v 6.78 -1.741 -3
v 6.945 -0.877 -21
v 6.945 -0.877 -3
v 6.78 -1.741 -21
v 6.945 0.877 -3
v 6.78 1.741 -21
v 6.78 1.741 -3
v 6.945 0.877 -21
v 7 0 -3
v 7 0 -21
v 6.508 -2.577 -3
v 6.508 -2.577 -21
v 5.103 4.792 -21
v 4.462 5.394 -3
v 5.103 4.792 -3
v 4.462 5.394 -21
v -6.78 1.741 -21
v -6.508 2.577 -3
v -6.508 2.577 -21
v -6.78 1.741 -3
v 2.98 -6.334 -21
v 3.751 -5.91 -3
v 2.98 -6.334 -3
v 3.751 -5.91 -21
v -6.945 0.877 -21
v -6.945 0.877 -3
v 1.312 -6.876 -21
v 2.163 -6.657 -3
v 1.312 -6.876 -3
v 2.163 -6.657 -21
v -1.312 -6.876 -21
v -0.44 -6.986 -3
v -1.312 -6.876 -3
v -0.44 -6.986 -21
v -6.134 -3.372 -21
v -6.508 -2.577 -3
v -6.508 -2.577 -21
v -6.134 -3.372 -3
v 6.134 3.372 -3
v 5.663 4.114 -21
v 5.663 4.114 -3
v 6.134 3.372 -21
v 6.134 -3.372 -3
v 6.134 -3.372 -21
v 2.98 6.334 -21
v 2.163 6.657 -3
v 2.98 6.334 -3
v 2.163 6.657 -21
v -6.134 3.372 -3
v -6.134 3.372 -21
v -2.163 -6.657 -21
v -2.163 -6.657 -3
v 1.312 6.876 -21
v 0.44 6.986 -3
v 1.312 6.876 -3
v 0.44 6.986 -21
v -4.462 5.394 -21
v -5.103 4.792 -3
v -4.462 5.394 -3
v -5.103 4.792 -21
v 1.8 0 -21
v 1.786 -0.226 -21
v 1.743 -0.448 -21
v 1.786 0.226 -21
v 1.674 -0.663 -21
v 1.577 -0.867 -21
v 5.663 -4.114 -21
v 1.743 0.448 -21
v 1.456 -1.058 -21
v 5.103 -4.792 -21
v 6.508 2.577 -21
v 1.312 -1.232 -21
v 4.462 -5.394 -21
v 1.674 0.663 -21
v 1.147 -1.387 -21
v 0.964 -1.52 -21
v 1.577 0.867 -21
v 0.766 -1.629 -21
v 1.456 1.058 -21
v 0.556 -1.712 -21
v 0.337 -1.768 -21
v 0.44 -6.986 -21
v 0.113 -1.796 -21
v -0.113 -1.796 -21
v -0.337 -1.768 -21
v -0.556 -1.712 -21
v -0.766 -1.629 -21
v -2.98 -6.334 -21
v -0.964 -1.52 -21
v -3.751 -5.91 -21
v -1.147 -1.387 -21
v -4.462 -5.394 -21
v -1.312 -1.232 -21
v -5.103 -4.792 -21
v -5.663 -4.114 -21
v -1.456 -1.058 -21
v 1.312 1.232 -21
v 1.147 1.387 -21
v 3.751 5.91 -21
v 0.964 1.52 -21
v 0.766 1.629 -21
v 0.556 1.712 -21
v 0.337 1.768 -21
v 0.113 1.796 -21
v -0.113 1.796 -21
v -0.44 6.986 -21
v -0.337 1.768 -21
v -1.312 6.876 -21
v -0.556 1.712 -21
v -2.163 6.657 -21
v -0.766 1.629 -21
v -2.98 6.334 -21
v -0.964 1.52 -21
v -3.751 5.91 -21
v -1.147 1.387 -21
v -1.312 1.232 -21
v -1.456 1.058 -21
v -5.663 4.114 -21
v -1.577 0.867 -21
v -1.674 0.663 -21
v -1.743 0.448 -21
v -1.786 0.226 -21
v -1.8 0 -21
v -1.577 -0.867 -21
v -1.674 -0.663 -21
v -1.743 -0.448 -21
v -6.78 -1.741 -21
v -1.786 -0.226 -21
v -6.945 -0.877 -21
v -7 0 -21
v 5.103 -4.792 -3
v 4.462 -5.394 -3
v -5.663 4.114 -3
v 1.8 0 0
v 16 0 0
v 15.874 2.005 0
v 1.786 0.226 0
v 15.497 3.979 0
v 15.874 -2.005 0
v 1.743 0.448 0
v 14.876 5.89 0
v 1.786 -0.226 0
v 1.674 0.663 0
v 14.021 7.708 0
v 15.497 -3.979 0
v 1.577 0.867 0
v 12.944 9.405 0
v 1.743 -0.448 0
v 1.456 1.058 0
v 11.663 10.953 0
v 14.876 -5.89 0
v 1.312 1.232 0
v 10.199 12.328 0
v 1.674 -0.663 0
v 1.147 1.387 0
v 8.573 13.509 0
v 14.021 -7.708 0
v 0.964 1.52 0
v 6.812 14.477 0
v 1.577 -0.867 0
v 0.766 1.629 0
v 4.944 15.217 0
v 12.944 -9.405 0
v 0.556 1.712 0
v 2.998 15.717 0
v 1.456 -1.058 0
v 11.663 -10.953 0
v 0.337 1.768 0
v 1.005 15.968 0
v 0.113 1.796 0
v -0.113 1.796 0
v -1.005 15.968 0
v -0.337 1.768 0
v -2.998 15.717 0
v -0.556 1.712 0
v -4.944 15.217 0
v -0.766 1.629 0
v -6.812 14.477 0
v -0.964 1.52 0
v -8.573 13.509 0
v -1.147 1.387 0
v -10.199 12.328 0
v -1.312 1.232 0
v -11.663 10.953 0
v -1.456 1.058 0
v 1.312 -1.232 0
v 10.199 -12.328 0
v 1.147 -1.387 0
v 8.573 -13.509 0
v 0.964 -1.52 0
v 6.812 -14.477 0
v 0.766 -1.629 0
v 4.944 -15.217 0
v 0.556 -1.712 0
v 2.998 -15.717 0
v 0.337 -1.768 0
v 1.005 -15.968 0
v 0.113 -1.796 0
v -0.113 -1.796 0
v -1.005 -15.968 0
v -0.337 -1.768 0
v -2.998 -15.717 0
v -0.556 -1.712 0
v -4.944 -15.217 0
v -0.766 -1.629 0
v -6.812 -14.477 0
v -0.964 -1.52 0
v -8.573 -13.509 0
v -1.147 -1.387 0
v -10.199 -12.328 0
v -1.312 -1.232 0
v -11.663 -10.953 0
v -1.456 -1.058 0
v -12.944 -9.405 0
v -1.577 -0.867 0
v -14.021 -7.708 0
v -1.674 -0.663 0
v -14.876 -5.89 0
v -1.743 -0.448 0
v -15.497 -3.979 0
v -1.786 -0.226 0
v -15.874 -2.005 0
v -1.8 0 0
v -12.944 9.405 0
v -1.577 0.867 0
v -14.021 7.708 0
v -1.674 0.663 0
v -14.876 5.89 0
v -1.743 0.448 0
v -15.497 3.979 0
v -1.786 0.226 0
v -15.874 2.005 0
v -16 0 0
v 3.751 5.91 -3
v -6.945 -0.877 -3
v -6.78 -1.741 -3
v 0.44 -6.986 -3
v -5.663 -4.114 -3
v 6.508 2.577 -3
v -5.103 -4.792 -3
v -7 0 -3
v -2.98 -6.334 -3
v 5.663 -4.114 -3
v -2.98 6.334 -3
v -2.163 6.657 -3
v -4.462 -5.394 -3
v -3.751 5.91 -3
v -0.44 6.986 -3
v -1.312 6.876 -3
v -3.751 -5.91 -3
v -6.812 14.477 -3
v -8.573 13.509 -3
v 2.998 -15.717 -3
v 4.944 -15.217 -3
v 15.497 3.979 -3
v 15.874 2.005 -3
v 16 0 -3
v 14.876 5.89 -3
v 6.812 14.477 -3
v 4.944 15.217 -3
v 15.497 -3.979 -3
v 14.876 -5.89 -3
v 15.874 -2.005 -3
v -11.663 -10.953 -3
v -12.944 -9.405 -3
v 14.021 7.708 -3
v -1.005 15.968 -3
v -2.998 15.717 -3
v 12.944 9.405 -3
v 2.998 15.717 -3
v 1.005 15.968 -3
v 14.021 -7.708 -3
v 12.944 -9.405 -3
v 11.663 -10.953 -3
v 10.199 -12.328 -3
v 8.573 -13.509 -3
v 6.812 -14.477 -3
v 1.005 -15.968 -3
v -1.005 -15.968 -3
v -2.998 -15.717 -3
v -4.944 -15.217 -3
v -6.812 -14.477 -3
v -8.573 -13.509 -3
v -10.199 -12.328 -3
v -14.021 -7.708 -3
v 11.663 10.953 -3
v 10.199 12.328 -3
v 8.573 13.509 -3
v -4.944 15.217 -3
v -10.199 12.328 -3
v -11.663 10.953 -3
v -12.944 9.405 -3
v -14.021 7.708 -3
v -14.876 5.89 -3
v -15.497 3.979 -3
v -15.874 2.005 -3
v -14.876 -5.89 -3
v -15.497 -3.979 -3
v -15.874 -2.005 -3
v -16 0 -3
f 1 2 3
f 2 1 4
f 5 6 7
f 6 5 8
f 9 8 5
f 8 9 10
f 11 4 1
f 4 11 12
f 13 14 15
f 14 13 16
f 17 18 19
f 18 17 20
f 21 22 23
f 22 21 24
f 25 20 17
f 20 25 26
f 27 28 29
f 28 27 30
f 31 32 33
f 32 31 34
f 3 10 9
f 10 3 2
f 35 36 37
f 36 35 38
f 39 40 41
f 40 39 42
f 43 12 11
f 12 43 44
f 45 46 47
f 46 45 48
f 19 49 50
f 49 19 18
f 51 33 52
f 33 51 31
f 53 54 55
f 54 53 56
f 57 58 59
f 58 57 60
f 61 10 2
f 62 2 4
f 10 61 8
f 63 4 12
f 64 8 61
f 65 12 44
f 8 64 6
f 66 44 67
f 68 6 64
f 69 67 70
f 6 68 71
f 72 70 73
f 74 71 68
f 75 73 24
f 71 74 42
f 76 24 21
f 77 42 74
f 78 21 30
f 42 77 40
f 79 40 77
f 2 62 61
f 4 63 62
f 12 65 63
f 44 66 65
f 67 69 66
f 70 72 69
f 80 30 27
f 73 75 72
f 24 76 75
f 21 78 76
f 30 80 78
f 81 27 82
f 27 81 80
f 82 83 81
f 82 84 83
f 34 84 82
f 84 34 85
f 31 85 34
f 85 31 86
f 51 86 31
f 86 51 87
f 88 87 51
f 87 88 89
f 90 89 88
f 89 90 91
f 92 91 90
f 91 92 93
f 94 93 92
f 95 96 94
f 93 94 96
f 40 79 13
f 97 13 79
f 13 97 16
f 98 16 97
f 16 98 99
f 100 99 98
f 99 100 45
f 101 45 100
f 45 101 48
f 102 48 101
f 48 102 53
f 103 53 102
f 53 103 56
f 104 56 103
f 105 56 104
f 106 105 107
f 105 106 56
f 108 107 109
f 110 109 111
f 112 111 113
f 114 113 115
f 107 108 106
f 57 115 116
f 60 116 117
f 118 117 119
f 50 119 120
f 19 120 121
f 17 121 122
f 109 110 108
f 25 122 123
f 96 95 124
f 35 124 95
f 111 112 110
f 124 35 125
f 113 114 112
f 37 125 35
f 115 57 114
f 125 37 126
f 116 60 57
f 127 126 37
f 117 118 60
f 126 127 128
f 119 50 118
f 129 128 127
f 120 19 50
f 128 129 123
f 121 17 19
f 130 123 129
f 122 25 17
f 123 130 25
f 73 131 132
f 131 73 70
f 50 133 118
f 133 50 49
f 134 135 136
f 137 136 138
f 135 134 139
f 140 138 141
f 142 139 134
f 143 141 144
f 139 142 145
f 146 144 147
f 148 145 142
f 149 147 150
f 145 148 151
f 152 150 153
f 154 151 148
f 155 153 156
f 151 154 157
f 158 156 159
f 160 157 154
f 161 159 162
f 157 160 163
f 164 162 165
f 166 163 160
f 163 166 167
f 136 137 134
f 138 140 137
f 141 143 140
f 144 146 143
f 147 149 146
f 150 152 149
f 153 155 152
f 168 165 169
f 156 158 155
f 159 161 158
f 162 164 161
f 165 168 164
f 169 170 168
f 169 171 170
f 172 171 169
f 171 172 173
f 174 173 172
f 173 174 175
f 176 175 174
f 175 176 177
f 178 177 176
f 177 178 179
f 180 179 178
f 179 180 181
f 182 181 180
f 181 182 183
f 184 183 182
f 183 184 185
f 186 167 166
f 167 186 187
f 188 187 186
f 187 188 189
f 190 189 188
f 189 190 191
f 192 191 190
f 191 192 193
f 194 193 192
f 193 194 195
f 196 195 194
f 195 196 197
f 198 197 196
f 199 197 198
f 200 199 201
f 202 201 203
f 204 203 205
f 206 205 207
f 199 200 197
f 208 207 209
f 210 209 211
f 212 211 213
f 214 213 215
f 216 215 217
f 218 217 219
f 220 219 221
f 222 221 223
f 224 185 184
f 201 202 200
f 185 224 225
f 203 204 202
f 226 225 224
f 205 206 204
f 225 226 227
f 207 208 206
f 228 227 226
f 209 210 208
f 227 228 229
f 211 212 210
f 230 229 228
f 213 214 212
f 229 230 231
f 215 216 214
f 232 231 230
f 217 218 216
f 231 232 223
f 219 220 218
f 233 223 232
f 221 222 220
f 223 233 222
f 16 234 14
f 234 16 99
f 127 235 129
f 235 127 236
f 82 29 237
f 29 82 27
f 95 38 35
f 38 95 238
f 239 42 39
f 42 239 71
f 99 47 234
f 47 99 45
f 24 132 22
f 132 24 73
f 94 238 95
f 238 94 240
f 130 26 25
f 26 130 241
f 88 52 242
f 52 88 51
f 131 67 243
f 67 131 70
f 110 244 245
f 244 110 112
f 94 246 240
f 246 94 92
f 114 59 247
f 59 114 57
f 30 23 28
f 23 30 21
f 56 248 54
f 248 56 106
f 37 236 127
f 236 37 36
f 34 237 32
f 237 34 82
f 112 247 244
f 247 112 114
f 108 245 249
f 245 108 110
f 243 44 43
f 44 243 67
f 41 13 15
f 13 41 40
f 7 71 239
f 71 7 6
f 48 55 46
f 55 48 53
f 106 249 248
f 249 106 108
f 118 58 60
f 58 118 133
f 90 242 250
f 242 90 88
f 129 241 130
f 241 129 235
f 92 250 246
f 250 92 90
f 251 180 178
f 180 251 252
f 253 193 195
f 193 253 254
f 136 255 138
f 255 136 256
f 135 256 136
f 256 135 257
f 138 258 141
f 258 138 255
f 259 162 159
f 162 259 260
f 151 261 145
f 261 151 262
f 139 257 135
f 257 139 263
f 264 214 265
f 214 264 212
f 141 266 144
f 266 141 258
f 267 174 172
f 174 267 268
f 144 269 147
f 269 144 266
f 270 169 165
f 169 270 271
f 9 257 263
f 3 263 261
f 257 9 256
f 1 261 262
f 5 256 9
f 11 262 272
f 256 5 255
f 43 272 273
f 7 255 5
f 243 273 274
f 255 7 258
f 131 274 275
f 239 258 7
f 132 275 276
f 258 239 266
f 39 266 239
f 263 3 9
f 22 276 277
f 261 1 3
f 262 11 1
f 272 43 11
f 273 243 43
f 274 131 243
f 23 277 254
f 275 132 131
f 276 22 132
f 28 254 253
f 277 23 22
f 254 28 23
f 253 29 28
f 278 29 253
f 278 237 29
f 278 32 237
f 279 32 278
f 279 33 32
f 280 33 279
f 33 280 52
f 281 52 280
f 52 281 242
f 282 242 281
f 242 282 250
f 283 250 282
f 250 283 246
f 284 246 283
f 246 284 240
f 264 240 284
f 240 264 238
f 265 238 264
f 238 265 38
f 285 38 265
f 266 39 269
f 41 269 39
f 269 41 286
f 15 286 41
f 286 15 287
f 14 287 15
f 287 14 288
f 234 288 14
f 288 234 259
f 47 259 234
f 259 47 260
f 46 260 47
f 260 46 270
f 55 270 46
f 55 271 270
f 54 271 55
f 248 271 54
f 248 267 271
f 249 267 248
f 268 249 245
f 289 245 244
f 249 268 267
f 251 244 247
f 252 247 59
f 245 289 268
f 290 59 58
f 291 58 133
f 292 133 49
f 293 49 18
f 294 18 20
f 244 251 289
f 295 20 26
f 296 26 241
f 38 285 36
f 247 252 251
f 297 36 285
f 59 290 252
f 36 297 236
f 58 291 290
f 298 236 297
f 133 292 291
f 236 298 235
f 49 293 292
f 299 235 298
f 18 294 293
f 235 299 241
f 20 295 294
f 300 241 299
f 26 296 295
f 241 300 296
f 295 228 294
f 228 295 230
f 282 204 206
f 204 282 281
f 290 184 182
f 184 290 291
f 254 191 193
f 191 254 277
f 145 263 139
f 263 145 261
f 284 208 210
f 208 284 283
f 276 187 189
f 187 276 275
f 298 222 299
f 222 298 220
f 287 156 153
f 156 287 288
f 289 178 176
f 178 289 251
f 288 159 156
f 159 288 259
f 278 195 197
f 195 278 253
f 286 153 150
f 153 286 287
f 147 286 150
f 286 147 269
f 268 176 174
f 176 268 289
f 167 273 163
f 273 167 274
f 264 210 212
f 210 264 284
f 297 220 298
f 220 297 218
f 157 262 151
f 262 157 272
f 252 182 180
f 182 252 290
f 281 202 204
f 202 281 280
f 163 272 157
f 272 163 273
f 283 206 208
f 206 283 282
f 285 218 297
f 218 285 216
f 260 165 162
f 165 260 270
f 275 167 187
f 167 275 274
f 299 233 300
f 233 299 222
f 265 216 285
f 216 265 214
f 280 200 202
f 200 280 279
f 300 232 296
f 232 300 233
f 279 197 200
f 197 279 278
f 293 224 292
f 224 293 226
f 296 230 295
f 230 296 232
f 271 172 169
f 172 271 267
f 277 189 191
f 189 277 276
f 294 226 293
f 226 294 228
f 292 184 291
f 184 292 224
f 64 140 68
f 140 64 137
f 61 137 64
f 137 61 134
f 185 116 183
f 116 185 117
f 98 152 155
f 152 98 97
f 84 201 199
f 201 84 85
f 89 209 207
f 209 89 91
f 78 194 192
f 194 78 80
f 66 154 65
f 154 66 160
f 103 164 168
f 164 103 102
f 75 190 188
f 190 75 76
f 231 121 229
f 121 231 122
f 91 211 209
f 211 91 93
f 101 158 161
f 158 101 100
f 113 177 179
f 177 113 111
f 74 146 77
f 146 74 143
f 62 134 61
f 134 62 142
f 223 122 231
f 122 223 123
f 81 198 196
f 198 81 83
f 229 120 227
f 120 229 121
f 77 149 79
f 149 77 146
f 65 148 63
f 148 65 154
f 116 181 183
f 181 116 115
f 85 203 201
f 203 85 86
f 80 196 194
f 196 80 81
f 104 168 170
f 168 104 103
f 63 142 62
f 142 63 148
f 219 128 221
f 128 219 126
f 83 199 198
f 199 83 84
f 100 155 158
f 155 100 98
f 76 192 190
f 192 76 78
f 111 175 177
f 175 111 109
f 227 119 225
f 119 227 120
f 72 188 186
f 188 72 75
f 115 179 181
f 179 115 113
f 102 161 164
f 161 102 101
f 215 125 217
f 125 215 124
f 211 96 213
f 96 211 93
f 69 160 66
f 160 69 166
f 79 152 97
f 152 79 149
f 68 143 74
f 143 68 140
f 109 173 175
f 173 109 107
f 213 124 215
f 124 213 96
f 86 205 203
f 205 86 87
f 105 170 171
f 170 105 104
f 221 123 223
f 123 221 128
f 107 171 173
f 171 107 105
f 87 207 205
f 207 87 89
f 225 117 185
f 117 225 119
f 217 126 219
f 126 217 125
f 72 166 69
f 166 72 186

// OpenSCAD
$fn = 50;


difference() {
	union() {
		translate(v = [0, 0, -21.0000000000]) {
			cylinder(h = 21, r = 7.0000000000);
		}
		translate(v = [0, 0, -3.0000000000]) {
			cylinder(h = 3, r = 16.0000000000);
		}
	}
	union() {
		#translate(v = [0, 0, -21]) {
			cylinder(h = 21, r = 1.8000000000);
		}
	}
}
